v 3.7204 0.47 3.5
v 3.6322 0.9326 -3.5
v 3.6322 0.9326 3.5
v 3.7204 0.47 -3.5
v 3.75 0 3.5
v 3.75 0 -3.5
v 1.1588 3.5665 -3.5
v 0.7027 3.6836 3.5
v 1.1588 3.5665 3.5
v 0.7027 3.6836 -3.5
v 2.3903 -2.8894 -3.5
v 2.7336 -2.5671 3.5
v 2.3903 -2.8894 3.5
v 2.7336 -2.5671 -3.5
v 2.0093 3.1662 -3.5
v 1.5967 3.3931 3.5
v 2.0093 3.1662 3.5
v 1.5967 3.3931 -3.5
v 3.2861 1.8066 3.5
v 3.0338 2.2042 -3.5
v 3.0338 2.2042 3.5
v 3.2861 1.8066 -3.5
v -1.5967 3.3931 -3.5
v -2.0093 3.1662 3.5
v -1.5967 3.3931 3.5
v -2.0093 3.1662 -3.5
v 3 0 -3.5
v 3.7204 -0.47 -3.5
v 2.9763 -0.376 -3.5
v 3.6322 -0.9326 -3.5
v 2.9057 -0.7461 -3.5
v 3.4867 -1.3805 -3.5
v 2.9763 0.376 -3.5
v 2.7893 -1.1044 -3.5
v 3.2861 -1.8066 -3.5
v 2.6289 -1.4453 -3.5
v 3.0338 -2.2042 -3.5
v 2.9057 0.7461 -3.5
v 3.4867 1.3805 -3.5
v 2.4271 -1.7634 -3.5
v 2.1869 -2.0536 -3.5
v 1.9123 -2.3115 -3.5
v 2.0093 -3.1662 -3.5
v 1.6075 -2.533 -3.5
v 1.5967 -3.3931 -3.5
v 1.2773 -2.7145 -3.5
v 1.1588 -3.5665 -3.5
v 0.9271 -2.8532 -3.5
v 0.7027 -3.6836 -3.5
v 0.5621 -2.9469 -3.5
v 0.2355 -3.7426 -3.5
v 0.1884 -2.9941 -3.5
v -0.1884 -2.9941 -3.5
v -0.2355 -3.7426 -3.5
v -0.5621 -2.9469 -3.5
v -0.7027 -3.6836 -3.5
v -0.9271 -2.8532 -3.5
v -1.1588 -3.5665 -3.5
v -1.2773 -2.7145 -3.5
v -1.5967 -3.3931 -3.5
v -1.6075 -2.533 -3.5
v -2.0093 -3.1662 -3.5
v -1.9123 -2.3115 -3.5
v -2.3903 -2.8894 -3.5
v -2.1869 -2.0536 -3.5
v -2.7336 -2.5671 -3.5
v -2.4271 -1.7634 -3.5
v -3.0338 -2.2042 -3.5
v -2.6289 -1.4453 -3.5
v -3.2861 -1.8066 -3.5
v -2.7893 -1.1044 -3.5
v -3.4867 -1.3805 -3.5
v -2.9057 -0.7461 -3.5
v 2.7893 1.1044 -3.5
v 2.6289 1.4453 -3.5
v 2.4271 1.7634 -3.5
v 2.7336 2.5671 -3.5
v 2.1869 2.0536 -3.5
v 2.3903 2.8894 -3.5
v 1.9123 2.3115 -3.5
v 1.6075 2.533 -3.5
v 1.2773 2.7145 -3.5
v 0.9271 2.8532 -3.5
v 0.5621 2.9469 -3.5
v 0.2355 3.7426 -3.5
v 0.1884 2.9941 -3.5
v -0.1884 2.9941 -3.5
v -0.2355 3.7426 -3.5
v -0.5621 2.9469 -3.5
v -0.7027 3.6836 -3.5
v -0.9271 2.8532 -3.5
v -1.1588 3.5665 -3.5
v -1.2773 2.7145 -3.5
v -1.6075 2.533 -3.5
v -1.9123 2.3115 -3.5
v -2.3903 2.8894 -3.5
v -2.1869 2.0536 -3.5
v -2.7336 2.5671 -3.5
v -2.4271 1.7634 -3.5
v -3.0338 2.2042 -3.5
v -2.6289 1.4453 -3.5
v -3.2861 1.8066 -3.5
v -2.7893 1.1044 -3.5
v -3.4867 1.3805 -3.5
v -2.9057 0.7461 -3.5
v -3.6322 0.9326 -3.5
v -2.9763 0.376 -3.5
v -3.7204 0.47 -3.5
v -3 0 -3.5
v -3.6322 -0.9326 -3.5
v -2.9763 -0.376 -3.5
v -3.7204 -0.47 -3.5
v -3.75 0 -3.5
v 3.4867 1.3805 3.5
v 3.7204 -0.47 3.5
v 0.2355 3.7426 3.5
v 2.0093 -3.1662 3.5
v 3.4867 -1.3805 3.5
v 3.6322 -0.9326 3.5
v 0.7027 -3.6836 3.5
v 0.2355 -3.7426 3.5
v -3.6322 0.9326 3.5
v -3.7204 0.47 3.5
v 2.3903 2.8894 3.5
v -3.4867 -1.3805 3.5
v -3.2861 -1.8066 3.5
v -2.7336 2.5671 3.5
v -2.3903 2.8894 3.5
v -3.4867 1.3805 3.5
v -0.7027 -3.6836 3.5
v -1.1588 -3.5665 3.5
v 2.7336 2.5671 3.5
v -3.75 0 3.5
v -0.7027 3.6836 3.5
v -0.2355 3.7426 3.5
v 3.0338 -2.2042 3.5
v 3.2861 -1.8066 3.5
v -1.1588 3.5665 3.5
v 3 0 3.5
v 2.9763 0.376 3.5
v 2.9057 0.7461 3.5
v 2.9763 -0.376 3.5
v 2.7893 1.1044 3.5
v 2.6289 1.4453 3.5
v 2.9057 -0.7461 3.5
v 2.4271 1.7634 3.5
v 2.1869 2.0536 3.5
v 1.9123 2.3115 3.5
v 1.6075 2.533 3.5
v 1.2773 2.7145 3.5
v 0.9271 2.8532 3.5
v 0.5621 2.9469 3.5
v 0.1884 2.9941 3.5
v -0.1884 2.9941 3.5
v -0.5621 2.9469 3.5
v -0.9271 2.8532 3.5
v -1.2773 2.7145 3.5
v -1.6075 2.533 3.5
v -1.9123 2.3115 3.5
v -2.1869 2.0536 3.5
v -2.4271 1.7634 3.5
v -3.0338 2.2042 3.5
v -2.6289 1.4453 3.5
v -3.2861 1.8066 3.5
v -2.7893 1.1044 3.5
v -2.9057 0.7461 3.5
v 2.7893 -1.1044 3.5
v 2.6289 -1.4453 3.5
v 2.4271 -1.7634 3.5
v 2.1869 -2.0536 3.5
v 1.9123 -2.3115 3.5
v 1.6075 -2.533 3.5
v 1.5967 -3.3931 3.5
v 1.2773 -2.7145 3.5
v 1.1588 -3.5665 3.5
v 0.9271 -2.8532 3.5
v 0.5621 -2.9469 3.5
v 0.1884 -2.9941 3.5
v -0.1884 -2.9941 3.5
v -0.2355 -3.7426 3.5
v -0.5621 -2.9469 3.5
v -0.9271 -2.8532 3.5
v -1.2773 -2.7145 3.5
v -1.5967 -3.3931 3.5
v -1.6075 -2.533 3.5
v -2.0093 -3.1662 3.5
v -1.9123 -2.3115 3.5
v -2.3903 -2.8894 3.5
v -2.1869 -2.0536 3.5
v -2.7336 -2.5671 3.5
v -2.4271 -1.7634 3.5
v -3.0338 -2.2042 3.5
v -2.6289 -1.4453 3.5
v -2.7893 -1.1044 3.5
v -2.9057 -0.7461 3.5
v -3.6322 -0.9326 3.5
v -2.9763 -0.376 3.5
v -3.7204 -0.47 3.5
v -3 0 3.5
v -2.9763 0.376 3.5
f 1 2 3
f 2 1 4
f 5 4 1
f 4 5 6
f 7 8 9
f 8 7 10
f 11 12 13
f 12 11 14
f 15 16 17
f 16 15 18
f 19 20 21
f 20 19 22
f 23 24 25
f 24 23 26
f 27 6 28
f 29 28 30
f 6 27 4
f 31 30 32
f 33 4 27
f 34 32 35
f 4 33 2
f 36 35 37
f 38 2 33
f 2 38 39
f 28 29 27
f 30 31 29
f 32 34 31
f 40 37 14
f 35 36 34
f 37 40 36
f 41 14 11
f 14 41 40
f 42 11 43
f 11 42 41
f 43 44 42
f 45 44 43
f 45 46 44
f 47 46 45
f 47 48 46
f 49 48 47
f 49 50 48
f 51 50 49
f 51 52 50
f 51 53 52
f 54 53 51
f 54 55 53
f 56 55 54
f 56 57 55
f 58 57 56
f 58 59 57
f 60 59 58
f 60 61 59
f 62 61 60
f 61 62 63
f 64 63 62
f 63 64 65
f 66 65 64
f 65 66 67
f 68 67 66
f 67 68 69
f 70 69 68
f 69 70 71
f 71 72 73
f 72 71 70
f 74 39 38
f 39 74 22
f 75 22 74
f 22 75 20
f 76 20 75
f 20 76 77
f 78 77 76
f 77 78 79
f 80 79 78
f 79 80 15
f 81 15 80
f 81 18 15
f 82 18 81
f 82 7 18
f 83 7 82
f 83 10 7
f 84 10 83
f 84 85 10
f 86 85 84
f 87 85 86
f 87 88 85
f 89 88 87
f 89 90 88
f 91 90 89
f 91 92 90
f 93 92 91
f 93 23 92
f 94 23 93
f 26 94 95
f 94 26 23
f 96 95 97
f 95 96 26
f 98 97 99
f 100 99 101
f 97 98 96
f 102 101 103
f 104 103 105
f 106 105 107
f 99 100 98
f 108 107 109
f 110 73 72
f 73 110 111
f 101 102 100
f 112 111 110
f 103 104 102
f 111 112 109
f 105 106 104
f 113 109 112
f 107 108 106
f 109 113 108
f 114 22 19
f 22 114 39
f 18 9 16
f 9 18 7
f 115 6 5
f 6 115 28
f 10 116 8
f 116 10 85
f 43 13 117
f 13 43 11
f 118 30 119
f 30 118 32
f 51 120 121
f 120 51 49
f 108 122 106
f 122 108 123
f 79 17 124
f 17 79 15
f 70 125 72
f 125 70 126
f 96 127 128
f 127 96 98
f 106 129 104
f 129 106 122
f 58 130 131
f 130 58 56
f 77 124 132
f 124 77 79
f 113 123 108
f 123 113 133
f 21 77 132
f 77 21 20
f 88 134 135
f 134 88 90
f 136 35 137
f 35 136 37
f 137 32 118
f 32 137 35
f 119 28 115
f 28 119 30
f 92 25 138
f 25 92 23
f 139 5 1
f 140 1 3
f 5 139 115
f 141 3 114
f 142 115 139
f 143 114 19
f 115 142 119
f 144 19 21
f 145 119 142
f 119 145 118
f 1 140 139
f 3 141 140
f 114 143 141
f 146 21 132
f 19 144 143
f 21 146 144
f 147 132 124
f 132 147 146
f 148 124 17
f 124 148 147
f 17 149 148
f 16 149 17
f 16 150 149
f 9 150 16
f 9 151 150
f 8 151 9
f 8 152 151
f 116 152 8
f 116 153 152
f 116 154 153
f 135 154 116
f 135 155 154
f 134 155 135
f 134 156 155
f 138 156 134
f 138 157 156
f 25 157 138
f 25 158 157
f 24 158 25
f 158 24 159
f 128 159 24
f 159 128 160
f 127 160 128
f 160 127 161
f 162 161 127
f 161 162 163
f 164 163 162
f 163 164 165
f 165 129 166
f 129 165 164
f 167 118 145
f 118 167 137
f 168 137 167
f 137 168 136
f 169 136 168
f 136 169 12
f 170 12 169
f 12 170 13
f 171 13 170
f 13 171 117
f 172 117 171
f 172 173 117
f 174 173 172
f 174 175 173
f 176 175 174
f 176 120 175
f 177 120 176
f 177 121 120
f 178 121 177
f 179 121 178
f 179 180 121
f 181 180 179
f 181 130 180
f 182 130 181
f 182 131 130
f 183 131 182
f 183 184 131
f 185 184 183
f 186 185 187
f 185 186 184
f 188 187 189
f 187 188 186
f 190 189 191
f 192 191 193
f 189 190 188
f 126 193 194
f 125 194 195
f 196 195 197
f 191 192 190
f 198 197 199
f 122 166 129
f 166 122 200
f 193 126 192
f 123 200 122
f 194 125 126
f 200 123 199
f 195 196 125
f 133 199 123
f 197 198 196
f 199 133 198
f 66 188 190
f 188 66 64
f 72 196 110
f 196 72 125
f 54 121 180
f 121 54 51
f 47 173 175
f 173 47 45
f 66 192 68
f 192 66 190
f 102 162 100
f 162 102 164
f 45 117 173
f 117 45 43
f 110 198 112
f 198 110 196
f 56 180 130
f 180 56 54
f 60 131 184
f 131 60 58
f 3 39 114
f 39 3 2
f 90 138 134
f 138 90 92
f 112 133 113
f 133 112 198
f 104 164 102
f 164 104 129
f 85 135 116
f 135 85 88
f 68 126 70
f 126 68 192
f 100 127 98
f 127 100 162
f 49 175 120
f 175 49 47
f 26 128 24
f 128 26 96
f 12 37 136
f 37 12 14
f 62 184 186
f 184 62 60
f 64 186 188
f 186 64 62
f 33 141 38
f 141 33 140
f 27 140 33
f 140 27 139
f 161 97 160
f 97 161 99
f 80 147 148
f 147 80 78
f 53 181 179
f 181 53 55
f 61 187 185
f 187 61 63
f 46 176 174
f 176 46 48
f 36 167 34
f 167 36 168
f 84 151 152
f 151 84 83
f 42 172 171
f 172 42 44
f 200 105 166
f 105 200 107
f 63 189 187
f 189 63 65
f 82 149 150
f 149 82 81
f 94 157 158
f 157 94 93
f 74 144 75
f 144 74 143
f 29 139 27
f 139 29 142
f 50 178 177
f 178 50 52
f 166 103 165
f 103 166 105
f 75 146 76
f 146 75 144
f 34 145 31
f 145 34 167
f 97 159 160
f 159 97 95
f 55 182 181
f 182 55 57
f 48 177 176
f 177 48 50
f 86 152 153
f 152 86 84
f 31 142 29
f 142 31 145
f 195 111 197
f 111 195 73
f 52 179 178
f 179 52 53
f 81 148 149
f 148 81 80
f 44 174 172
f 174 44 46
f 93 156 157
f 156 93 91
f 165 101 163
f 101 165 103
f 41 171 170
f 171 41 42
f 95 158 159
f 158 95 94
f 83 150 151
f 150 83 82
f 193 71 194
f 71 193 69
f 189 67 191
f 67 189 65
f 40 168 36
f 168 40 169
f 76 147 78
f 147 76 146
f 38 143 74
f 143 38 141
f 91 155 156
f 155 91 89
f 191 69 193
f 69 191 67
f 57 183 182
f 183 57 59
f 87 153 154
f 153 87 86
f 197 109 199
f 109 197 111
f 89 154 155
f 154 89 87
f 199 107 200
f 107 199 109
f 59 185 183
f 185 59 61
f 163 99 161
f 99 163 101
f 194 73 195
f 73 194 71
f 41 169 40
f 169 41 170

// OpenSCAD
$fn = 50;


difference() {
	union() {
		translate(v = [0, 0, -3.5000000000]) {
			cylinder(h = 7, r = 3.7500000000);
		}
	}
	union() {
		translate(v = [0, 0, -100.0000000000]) {
			cylinder(h = 200, r = 3.0000000000);
		}
	}
}
